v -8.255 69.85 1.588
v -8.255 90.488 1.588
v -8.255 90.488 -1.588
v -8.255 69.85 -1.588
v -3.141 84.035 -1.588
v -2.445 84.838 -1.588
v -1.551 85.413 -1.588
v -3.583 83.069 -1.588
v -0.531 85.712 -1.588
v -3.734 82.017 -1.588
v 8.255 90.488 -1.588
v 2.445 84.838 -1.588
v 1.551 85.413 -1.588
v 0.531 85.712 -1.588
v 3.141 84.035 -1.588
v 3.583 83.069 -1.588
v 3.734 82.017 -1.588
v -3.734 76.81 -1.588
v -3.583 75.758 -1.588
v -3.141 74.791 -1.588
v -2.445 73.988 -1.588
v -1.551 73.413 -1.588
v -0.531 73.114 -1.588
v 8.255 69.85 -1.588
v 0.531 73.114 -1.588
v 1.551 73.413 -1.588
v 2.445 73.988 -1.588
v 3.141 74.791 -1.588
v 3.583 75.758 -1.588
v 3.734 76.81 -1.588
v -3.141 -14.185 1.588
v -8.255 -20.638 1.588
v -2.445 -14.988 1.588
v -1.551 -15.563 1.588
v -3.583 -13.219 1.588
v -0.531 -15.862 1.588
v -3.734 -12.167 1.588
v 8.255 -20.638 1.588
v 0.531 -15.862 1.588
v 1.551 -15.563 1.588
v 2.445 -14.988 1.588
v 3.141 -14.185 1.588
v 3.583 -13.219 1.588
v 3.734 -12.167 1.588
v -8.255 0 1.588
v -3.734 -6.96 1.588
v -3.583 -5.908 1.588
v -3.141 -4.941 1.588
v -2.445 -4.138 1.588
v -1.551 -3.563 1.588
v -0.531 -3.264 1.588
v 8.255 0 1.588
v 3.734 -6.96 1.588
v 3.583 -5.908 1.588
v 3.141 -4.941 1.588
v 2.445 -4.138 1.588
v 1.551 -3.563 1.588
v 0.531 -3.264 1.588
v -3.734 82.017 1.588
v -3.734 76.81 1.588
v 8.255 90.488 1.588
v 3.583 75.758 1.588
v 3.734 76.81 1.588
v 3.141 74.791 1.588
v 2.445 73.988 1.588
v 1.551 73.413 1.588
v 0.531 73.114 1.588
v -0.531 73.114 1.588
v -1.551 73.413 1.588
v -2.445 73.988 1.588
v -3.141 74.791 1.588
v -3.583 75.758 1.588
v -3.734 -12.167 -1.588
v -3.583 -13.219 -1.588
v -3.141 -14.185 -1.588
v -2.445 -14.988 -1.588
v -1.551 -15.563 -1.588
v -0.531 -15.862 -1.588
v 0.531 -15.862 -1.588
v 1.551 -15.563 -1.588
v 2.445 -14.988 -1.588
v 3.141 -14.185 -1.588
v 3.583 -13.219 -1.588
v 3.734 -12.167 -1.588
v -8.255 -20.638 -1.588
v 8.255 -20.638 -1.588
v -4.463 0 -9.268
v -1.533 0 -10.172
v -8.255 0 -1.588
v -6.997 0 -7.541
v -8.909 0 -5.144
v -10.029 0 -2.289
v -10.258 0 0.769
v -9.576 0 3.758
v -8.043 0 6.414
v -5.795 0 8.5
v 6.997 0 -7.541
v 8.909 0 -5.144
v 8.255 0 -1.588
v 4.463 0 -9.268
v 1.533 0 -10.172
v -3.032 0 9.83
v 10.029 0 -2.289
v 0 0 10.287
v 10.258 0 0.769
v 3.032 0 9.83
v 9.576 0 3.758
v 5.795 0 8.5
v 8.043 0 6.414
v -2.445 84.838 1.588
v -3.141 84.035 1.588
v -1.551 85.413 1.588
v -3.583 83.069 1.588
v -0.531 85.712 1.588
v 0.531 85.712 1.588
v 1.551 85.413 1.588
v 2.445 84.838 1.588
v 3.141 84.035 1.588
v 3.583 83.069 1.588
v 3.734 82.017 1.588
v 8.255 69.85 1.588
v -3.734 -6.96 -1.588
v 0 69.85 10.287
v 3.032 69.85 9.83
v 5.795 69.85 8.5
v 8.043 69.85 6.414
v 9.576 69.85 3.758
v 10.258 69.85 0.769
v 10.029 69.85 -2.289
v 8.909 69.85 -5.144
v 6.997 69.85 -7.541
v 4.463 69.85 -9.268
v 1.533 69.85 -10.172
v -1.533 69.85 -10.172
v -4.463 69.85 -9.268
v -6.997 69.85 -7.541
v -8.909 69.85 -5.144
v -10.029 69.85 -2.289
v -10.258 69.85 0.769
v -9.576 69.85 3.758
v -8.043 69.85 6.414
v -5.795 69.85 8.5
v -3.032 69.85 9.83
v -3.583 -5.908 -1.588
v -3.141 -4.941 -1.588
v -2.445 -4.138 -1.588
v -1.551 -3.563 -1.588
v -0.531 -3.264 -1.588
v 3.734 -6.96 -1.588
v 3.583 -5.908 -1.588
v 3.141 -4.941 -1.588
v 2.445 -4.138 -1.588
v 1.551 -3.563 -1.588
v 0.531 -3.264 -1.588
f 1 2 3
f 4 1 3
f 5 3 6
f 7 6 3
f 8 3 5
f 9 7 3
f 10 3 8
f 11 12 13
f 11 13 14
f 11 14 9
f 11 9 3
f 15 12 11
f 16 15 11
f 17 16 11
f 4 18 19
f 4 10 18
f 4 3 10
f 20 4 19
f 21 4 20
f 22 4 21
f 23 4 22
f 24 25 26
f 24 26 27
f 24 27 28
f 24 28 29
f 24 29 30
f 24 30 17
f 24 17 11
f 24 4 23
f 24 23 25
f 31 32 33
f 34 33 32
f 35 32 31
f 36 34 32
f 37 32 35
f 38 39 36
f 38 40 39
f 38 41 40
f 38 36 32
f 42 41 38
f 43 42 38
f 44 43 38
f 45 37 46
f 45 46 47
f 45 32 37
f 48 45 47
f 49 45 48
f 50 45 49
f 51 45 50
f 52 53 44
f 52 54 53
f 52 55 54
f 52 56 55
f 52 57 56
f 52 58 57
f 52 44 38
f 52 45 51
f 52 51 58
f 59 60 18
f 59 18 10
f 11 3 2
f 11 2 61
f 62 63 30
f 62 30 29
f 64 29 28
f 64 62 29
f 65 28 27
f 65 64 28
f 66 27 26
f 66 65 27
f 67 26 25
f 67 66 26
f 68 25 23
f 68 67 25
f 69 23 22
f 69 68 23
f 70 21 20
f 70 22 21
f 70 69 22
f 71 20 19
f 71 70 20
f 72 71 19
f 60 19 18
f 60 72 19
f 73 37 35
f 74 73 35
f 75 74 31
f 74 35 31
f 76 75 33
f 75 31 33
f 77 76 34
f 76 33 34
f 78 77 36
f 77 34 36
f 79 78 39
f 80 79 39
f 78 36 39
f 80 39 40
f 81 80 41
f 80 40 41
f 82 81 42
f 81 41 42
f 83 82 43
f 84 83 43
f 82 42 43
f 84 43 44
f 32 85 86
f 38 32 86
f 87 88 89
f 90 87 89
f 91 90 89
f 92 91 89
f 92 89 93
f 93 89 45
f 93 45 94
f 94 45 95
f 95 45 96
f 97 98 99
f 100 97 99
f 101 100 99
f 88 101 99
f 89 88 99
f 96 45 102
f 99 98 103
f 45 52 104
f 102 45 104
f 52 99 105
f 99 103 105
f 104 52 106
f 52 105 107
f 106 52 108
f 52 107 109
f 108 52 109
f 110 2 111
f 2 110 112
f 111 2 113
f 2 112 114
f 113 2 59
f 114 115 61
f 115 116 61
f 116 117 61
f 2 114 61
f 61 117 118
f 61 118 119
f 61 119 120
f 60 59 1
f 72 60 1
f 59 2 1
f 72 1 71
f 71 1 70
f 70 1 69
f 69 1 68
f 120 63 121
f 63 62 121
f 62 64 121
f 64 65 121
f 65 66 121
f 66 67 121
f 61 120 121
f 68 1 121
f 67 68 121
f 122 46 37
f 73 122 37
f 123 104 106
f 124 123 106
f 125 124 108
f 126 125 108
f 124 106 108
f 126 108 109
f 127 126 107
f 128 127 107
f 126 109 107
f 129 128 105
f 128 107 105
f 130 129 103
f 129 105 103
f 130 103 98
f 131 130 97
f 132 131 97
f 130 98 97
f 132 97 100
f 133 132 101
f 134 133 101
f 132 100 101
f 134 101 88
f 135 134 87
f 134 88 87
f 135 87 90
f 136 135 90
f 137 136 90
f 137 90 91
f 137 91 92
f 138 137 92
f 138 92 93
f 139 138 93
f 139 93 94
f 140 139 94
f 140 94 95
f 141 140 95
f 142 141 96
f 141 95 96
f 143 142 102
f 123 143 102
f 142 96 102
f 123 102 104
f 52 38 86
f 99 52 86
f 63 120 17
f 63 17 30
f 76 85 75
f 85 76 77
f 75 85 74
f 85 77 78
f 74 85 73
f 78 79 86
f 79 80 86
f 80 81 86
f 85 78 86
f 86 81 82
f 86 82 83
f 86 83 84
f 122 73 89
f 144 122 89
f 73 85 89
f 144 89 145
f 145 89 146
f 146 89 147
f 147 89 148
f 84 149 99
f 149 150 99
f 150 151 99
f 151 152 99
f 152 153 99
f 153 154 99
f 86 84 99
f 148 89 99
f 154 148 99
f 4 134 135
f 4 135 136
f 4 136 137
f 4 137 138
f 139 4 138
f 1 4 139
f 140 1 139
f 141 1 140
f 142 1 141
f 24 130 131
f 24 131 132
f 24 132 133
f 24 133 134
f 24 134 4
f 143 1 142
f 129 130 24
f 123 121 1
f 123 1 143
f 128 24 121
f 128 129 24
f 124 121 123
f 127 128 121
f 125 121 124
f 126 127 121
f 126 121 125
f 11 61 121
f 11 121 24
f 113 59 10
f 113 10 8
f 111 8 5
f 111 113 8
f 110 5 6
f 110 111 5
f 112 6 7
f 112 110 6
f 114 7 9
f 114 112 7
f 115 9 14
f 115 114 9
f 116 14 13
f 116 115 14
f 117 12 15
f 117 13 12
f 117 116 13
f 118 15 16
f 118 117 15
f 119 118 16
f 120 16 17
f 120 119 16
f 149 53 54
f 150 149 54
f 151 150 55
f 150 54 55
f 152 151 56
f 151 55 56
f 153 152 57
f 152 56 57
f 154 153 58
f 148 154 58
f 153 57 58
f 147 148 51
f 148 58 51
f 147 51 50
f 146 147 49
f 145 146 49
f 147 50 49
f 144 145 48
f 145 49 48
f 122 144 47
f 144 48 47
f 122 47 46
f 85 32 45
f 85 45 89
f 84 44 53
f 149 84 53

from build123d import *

# Parameters (mm, degrees)
SKETCH1_R           = 10.287
BOSS_EXTRUDE1_DEPTH = 69.85
SKETCH2_W           = 16.51
SKETCH2_H           = 3.175
BOSS_EXTRUDE2_DEPTH = 20.6375
CUT_EXTRUDE1_DEPTH  = 92.841242236


with BuildPart() as part:
    # Sketch1 → Boss-Extrude1 (new body)
    with BuildSketch(Plane(origin=(0, 0, 0), x_dir=(1, 0, 0), z_dir=(0, 1, 0))):
        with Locations(Location((0, 0, 0), (0, 0, 270))):
            Circle(SKETCH1_R)
    extrude(amount=BOSS_EXTRUDE1_DEPTH)

    # Sketch2 → Boss-Extrude2 (add)
    with BuildSketch(Plane(origin=(0, 69.85, 0), x_dir=(1, 0, 0), z_dir=(0, 1, 0))):
        Rectangle(SKETCH2_W, SKETCH2_H)
    boss_extrude2 = extrude(amount=BOSS_EXTRUDE2_DEPTH)

    # Sketch3 → Cut-Extrude1 (cut, through all)
    with BuildSketch(Plane.XY.offset(1.5875)):
        with BuildLine():
            Line((3.7338, 82.0166), (3.7338, 76.8096))
            ThreePointArc((3.7338, 76.8096), (0, 73.0758), (-3.7338, 76.8096))
            Line((-3.7338, 76.8096), (-3.7338, 82.0166))
            ThreePointArc((-3.7338, 82.0166), (0, 85.7504), (3.7338, 82.0166))
        make_face()
    cut_extrude1 = extrude(amount=-CUT_EXTRUDE1_DEPTH, mode=Mode.SUBTRACT)

    # Mirror2: Boss-Extrude2, Cut-Extrude1 across plane
    add(boss_extrude2.mirror(Plane.ZX.offset(34.925)))
    add(cut_extrude1.mirror(Plane.ZX.offset(34.925)), mode=Mode.SUBTRACT)


solid = part.part
